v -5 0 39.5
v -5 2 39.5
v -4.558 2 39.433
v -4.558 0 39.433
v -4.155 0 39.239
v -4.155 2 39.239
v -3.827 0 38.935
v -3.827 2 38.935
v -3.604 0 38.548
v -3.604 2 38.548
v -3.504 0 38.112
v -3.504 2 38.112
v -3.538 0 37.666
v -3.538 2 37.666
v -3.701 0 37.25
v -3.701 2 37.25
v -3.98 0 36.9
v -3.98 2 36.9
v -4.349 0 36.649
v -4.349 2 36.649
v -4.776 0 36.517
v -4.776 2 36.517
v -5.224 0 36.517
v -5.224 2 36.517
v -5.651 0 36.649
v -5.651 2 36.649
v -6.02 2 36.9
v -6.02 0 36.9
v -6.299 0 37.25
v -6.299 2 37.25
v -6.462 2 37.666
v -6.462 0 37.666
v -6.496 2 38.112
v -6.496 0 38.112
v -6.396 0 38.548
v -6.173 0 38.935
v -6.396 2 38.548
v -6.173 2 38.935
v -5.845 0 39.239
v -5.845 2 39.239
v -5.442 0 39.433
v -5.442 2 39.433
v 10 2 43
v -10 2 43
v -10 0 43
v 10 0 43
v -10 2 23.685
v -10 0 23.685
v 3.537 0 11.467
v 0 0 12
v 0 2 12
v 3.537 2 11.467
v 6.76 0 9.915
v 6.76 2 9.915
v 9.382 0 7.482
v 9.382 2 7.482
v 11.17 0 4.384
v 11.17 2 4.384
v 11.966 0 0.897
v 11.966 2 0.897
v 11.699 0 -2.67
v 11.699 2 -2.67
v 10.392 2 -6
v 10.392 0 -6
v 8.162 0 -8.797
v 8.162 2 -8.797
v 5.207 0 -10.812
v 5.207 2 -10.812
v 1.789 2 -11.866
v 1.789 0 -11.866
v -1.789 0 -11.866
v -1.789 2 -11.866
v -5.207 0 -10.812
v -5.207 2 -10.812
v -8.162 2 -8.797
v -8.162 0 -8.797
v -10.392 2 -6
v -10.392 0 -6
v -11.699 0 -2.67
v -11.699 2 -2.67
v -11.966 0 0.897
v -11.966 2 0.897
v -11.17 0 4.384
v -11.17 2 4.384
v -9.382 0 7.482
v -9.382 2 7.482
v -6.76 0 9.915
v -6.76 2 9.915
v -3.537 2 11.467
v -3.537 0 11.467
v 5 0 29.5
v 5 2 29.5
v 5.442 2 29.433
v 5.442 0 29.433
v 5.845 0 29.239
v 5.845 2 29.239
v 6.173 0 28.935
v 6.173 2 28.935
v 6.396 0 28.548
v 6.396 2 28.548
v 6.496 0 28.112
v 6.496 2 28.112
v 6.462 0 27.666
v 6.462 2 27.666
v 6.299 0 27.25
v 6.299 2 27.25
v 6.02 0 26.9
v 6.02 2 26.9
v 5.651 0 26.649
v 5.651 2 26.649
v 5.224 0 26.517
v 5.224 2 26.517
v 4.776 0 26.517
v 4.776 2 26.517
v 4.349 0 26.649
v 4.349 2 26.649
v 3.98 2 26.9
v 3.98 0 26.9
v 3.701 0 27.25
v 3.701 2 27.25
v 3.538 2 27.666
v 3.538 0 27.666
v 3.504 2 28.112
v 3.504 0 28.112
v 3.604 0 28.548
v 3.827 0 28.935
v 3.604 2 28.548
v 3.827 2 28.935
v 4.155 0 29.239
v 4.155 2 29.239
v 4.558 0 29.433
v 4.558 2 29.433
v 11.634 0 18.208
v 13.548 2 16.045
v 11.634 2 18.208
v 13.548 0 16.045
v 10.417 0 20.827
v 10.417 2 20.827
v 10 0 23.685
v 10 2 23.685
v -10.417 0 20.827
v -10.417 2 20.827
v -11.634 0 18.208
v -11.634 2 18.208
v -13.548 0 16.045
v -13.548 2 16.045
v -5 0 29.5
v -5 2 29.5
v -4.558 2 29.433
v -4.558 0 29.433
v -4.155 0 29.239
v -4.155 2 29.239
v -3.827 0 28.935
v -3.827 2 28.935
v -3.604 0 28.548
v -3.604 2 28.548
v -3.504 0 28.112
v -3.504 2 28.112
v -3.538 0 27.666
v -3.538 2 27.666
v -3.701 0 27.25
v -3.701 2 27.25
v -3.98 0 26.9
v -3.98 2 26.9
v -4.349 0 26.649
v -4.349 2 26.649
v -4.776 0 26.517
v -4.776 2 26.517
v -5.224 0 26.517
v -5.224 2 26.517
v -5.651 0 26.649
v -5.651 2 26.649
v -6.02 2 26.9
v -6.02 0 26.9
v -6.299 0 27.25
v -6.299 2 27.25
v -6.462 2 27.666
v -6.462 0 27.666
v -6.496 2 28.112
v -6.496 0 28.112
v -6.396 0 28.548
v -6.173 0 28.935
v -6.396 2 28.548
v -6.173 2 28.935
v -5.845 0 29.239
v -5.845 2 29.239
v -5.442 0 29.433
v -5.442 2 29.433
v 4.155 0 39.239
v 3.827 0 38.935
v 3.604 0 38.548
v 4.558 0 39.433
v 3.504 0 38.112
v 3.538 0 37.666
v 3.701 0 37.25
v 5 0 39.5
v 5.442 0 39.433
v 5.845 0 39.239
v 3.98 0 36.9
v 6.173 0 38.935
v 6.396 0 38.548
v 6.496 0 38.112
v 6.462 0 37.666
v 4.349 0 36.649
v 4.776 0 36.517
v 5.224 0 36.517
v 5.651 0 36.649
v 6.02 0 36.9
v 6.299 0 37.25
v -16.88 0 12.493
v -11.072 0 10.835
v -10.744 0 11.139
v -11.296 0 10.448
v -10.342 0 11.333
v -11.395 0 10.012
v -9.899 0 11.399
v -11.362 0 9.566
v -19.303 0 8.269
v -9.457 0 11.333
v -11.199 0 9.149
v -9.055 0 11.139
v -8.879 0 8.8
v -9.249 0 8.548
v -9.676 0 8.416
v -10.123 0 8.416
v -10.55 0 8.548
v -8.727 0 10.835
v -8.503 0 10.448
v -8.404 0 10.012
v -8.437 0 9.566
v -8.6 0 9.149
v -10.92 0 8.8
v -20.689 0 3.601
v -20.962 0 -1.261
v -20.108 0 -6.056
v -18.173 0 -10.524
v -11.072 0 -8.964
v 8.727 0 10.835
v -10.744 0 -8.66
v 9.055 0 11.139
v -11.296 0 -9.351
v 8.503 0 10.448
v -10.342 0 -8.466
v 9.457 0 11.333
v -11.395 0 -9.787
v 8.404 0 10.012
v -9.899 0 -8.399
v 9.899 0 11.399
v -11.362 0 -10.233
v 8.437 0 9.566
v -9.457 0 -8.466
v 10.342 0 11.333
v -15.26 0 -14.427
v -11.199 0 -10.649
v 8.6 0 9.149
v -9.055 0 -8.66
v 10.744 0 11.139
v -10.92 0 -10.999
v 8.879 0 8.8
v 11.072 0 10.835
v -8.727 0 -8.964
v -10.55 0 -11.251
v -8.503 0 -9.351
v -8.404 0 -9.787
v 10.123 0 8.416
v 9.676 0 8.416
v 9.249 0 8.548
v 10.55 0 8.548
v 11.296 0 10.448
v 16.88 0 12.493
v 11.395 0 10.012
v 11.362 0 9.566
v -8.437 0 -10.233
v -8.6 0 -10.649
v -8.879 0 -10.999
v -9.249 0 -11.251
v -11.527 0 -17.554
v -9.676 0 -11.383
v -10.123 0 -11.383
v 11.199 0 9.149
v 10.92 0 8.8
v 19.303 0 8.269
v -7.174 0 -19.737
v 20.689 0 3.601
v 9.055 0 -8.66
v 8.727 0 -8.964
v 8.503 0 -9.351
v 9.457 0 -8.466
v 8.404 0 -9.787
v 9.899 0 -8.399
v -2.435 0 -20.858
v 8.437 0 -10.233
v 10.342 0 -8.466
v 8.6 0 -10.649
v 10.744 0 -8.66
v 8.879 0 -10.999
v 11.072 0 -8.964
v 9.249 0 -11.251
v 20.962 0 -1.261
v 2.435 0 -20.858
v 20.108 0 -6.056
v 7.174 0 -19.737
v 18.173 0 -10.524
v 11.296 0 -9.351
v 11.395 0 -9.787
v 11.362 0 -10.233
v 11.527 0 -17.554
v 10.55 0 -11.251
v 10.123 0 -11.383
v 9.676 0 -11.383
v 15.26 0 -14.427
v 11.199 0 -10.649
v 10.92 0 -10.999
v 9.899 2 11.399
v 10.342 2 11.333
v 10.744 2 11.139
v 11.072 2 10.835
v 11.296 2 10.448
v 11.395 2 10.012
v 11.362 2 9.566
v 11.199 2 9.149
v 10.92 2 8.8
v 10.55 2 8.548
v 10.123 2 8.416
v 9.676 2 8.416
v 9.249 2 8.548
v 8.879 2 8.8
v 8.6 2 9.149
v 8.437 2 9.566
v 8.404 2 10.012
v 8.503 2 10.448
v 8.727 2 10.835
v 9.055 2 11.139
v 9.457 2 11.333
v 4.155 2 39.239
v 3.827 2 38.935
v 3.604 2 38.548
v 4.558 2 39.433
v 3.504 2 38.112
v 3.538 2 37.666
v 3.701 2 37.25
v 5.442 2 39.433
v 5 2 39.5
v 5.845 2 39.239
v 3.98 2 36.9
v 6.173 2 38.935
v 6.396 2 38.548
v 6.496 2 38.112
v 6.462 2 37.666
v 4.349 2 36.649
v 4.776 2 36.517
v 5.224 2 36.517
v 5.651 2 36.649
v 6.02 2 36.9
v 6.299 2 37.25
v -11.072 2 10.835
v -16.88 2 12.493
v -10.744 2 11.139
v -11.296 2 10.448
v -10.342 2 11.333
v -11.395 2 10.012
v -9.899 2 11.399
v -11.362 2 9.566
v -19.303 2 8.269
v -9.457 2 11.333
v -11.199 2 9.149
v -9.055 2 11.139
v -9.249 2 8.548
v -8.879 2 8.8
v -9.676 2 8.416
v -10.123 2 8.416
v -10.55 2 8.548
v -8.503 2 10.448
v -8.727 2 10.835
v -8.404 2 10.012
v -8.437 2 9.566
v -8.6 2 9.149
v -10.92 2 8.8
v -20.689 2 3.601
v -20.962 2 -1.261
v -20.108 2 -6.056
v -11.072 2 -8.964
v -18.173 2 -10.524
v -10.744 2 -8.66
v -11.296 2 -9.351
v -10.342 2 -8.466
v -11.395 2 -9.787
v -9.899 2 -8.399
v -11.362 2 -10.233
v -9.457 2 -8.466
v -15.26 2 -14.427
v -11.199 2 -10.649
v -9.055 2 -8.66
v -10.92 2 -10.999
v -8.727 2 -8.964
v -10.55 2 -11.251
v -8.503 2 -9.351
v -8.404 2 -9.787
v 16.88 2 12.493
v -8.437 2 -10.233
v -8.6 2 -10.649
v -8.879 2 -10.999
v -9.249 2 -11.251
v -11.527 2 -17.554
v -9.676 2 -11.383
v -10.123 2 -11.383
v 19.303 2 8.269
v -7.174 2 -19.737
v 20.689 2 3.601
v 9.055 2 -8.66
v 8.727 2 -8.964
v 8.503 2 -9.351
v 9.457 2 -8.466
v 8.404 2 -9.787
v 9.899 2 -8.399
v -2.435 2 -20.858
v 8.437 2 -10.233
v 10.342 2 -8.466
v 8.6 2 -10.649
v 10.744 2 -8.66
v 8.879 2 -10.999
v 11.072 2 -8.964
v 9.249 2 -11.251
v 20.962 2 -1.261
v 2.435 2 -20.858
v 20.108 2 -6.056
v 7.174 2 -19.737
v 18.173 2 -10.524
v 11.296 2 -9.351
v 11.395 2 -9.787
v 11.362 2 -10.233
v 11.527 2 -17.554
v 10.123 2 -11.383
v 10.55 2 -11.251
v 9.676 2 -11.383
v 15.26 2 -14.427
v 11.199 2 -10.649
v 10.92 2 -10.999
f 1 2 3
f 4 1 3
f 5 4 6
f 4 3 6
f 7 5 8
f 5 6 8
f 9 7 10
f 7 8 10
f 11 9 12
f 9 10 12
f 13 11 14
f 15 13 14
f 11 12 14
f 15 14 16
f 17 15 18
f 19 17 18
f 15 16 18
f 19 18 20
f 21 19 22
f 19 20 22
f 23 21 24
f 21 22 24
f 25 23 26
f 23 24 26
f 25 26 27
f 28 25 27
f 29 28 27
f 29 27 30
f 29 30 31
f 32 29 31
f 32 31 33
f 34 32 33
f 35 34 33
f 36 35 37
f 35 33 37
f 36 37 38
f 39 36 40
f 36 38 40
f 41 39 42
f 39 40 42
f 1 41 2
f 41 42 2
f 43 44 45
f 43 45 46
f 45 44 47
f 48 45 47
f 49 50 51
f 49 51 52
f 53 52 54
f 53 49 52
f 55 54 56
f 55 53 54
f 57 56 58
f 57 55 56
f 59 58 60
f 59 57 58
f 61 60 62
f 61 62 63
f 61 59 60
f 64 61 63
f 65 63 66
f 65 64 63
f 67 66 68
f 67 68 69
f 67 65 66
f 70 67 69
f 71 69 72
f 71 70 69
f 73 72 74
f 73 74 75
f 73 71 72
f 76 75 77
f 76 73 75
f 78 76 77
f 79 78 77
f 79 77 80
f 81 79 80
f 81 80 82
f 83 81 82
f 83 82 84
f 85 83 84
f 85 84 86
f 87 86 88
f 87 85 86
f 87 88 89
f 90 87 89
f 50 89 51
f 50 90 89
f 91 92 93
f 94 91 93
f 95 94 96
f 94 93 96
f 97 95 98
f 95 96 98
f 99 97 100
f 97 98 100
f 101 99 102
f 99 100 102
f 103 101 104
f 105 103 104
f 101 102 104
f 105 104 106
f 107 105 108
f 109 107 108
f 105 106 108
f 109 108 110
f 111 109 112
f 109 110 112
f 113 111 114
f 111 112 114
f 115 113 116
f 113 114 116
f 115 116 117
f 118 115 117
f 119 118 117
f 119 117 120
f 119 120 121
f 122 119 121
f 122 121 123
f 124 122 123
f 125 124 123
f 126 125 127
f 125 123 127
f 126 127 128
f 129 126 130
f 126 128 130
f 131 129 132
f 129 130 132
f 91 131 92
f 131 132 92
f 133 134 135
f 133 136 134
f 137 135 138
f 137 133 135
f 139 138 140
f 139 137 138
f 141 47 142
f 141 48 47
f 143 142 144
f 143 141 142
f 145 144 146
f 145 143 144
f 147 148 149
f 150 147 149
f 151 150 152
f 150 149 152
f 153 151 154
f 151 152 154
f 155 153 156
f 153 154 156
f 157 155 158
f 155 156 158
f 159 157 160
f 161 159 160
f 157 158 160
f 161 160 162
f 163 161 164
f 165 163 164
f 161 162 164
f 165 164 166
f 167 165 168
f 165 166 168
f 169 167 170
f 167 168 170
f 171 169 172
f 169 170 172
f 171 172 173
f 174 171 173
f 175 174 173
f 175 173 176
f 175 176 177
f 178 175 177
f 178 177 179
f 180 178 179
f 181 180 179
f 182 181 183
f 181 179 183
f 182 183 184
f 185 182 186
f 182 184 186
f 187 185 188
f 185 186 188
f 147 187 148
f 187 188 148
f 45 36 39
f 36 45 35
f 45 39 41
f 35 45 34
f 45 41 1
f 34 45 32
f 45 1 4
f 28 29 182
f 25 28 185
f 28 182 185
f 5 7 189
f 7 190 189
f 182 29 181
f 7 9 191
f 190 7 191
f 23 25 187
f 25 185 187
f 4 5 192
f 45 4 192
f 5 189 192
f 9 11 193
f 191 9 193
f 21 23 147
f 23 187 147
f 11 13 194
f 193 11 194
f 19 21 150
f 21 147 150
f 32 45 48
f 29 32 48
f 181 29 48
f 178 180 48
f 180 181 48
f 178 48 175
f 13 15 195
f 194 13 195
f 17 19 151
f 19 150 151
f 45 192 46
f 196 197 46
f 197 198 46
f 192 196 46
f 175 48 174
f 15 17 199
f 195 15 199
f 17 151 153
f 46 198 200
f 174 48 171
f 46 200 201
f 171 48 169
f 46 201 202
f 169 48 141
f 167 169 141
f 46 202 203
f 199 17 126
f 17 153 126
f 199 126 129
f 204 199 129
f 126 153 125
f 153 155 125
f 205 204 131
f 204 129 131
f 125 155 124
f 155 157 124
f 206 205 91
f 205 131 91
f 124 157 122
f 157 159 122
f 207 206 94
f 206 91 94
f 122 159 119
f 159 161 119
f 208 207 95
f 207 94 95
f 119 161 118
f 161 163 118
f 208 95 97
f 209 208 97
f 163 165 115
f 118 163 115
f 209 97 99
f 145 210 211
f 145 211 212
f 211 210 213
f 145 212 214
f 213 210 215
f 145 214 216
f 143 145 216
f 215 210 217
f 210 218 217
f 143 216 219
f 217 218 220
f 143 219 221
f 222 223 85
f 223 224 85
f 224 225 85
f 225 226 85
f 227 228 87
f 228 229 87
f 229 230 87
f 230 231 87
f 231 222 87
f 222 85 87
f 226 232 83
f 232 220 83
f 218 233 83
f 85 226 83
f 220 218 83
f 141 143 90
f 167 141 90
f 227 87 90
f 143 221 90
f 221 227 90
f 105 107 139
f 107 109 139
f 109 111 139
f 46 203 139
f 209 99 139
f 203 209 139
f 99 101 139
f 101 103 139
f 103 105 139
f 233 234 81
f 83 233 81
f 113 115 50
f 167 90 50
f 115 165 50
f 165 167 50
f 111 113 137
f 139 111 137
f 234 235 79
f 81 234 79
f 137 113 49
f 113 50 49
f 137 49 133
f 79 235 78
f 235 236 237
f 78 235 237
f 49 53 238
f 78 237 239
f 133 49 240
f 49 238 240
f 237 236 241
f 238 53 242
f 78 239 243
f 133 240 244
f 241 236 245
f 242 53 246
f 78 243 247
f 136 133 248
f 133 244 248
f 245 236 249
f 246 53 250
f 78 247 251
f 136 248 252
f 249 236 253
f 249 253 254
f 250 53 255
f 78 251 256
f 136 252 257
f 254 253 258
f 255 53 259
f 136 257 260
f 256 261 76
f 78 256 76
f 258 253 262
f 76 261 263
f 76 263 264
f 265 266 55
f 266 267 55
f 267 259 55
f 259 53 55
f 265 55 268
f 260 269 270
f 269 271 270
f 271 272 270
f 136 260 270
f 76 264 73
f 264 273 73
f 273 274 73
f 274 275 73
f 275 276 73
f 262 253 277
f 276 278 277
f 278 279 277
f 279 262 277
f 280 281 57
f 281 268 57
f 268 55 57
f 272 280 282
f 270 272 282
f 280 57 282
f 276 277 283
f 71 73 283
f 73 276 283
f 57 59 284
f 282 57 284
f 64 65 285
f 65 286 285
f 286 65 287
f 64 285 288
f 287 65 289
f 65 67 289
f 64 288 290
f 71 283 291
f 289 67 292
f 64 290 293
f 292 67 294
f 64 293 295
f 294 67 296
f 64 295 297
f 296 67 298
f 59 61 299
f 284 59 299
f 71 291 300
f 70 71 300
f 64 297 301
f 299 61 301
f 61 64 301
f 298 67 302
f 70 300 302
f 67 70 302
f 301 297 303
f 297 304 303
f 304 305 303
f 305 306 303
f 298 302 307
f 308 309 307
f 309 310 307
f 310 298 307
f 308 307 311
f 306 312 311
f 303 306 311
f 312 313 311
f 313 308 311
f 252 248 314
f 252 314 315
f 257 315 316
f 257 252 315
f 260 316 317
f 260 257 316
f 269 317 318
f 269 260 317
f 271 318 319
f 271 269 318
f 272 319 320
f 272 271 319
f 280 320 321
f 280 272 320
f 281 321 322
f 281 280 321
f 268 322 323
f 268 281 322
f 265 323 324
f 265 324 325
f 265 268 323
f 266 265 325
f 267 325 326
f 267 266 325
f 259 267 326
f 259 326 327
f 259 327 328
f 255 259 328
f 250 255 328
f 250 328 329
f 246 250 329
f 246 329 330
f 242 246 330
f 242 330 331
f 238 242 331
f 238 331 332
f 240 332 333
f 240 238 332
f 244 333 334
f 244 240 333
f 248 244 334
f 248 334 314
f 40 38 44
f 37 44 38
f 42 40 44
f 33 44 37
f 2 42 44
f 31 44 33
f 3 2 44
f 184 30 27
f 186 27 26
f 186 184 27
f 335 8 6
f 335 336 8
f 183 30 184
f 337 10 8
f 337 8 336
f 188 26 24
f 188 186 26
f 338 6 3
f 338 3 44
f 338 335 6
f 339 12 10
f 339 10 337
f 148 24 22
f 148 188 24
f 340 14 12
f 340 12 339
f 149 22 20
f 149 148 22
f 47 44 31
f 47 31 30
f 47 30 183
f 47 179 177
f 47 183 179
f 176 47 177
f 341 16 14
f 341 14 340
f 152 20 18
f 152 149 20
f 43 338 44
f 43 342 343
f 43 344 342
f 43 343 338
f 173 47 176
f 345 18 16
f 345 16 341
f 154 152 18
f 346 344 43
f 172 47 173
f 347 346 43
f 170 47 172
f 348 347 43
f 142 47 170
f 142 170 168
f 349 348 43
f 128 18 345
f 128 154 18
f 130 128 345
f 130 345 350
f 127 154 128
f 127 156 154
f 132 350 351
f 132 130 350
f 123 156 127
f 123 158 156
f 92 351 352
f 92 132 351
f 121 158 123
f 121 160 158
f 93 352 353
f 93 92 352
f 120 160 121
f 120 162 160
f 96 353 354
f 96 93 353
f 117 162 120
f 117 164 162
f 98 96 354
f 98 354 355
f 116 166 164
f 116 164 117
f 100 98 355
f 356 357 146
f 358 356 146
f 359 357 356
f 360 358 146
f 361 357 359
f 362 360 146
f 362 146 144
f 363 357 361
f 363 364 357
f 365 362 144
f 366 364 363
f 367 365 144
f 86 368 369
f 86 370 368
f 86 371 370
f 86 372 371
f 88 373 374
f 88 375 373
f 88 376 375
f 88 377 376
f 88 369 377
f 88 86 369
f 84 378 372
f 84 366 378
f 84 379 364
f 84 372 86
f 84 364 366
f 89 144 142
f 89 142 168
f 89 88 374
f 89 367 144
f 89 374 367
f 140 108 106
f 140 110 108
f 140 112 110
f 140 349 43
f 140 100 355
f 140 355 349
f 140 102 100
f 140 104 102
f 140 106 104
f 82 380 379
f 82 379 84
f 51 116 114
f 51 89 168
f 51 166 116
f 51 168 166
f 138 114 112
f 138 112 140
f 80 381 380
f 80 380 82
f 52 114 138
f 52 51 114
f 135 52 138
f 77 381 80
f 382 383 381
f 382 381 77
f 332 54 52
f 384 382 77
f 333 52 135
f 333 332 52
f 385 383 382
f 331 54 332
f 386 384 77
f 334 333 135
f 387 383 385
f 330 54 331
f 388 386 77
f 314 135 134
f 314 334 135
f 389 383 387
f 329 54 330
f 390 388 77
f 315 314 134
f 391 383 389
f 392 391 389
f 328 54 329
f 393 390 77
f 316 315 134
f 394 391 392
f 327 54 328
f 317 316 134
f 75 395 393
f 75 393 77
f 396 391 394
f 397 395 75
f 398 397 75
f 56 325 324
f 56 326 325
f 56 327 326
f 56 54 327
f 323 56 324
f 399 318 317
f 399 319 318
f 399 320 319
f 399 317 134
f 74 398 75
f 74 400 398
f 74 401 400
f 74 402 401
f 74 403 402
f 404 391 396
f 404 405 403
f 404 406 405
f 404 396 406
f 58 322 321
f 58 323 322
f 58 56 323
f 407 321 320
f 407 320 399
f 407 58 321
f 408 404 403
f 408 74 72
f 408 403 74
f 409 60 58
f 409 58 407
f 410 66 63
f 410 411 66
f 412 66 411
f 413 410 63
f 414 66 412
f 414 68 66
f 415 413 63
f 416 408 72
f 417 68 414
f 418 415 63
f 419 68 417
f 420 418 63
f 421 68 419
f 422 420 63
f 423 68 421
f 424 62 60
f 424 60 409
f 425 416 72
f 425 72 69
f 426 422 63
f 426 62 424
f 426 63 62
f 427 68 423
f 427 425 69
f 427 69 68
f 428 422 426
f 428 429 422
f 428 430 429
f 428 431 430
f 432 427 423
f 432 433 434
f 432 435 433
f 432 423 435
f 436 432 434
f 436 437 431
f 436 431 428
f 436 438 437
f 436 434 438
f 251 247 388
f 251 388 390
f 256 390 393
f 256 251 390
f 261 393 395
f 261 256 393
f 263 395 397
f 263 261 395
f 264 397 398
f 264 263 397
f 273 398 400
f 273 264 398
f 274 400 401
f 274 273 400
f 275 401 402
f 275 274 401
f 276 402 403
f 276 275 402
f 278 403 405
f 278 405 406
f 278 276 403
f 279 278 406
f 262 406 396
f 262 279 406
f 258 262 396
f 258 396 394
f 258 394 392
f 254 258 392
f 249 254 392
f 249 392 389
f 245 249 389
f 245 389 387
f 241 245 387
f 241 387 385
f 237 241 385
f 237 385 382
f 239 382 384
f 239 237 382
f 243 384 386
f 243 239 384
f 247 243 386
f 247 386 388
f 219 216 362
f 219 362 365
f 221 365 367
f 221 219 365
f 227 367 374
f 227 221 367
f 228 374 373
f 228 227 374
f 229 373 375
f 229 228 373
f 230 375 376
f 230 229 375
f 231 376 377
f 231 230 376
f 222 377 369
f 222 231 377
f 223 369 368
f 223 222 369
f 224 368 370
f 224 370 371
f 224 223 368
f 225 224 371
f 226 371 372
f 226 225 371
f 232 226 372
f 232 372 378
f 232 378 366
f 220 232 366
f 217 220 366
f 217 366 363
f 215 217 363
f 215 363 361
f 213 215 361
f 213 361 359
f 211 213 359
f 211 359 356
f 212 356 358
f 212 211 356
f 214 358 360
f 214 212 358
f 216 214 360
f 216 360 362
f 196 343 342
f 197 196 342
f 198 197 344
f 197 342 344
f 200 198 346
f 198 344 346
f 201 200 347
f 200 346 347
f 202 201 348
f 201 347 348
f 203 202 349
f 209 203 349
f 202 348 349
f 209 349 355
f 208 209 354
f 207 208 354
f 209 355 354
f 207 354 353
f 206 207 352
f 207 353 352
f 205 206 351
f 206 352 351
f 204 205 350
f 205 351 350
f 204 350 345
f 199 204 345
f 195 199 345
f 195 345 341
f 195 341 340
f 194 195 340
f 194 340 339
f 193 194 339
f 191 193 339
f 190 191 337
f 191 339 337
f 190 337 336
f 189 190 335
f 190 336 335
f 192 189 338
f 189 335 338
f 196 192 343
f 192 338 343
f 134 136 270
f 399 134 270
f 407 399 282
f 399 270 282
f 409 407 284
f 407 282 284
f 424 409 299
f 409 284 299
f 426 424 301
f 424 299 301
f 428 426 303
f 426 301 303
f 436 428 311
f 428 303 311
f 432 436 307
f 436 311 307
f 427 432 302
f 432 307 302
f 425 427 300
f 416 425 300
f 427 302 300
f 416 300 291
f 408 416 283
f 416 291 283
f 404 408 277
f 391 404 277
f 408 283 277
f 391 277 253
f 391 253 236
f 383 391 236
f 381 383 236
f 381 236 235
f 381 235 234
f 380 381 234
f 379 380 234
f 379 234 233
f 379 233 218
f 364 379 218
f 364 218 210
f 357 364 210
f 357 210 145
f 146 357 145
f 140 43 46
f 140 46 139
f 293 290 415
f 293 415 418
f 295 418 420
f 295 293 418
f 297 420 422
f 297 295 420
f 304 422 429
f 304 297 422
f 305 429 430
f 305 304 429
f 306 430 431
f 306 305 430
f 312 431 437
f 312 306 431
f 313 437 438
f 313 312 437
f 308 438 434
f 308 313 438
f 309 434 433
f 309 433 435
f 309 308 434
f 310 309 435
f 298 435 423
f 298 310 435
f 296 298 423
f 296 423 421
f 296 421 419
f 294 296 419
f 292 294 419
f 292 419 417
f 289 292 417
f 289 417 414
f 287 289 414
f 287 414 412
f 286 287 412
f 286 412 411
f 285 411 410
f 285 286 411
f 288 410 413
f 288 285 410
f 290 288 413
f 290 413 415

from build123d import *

# Parameters (mm, degrees)
SKETCH_2_R      = 21
SKETCH_2_R_2    = 12
SKETCH_2_R_3    = 1.5
EXTRUDE_1_DEPTH = 2
SKETCH_4_W      = 20
SKETCH_4_H      = 25
SKETCH_4_R      = 1.5
EXTRUDE_2_DEPTH = 2
FILLET_1_R      = 10


with BuildPart() as part:
    # 草图2 → 凸台-拉伸1 (new body)
    with BuildSketch(Plane(origin=(0, 0, 0), x_dir=(1, 0, 0), z_dir=(0, 1, 0))):
        with Locations(Location((0, 0, 0), (0, 0, 270))):
            Circle(SKETCH_2_R)
        with Locations(Location((0, 0, 0), (0, 0, 270))):
            Circle(SKETCH_2_R_2, mode=Mode.SUBTRACT)
        with Locations(Location((9.899494937, 9.899494937, 0), (0, 0, 270))):
            Circle(SKETCH_2_R_3, mode=Mode.SUBTRACT)
        with Locations(Location((9.899494937, -9.899494937, 0), (0, 0, 270))):
            Circle(SKETCH_2_R_3, mode=Mode.SUBTRACT)
        with Locations(Location((-9.899494937, -9.899494937, 0), (0, 0, 270))):
            Circle(SKETCH_2_R_3, mode=Mode.SUBTRACT)
        with Locations(Location((-9.899494937, 9.899494937, 0), (0, 0, 270))):
            Circle(SKETCH_2_R_3, mode=Mode.SUBTRACT)
    extrude(amount=EXTRUDE_1_DEPTH)

    # 草图4 → 凸台-拉伸2 (add)
    with BuildSketch(Plane(origin=(0, 2, 0), x_dir=(1, 0, 0), z_dir=(0, 1, 0))):
        with Locations((0, -30.5)):
            Rectangle(SKETCH_4_W, SKETCH_4_H)
        with Locations(Location((-5, -38, 0), (0, 0, 270))):
            Circle(SKETCH_4_R, mode=Mode.SUBTRACT)
        with Locations(Location((5, -38, 0), (0, 0, 270))):
            Circle(SKETCH_4_R, mode=Mode.SUBTRACT)
        with Locations(Location((-5, -28, 0), (0, 0, 270))):
            Circle(SKETCH_4_R, mode=Mode.SUBTRACT)
        with Locations(Location((5, -28, 0), (0, 0, 270))):
            Circle(SKETCH_4_R, mode=Mode.SUBTRACT)
    extrude(amount=-EXTRUDE_2_DEPTH)

    # 圆角1
    fillet_1_edges = [part.edges().sort_by_distance(p)[0] for p in [
        (-10, 1, 18.466185313),
        (10, 1, 18.466185313),
    ]]
    fillet(fillet_1_edges, radius=FILLET_1_R)


solid = part.part
